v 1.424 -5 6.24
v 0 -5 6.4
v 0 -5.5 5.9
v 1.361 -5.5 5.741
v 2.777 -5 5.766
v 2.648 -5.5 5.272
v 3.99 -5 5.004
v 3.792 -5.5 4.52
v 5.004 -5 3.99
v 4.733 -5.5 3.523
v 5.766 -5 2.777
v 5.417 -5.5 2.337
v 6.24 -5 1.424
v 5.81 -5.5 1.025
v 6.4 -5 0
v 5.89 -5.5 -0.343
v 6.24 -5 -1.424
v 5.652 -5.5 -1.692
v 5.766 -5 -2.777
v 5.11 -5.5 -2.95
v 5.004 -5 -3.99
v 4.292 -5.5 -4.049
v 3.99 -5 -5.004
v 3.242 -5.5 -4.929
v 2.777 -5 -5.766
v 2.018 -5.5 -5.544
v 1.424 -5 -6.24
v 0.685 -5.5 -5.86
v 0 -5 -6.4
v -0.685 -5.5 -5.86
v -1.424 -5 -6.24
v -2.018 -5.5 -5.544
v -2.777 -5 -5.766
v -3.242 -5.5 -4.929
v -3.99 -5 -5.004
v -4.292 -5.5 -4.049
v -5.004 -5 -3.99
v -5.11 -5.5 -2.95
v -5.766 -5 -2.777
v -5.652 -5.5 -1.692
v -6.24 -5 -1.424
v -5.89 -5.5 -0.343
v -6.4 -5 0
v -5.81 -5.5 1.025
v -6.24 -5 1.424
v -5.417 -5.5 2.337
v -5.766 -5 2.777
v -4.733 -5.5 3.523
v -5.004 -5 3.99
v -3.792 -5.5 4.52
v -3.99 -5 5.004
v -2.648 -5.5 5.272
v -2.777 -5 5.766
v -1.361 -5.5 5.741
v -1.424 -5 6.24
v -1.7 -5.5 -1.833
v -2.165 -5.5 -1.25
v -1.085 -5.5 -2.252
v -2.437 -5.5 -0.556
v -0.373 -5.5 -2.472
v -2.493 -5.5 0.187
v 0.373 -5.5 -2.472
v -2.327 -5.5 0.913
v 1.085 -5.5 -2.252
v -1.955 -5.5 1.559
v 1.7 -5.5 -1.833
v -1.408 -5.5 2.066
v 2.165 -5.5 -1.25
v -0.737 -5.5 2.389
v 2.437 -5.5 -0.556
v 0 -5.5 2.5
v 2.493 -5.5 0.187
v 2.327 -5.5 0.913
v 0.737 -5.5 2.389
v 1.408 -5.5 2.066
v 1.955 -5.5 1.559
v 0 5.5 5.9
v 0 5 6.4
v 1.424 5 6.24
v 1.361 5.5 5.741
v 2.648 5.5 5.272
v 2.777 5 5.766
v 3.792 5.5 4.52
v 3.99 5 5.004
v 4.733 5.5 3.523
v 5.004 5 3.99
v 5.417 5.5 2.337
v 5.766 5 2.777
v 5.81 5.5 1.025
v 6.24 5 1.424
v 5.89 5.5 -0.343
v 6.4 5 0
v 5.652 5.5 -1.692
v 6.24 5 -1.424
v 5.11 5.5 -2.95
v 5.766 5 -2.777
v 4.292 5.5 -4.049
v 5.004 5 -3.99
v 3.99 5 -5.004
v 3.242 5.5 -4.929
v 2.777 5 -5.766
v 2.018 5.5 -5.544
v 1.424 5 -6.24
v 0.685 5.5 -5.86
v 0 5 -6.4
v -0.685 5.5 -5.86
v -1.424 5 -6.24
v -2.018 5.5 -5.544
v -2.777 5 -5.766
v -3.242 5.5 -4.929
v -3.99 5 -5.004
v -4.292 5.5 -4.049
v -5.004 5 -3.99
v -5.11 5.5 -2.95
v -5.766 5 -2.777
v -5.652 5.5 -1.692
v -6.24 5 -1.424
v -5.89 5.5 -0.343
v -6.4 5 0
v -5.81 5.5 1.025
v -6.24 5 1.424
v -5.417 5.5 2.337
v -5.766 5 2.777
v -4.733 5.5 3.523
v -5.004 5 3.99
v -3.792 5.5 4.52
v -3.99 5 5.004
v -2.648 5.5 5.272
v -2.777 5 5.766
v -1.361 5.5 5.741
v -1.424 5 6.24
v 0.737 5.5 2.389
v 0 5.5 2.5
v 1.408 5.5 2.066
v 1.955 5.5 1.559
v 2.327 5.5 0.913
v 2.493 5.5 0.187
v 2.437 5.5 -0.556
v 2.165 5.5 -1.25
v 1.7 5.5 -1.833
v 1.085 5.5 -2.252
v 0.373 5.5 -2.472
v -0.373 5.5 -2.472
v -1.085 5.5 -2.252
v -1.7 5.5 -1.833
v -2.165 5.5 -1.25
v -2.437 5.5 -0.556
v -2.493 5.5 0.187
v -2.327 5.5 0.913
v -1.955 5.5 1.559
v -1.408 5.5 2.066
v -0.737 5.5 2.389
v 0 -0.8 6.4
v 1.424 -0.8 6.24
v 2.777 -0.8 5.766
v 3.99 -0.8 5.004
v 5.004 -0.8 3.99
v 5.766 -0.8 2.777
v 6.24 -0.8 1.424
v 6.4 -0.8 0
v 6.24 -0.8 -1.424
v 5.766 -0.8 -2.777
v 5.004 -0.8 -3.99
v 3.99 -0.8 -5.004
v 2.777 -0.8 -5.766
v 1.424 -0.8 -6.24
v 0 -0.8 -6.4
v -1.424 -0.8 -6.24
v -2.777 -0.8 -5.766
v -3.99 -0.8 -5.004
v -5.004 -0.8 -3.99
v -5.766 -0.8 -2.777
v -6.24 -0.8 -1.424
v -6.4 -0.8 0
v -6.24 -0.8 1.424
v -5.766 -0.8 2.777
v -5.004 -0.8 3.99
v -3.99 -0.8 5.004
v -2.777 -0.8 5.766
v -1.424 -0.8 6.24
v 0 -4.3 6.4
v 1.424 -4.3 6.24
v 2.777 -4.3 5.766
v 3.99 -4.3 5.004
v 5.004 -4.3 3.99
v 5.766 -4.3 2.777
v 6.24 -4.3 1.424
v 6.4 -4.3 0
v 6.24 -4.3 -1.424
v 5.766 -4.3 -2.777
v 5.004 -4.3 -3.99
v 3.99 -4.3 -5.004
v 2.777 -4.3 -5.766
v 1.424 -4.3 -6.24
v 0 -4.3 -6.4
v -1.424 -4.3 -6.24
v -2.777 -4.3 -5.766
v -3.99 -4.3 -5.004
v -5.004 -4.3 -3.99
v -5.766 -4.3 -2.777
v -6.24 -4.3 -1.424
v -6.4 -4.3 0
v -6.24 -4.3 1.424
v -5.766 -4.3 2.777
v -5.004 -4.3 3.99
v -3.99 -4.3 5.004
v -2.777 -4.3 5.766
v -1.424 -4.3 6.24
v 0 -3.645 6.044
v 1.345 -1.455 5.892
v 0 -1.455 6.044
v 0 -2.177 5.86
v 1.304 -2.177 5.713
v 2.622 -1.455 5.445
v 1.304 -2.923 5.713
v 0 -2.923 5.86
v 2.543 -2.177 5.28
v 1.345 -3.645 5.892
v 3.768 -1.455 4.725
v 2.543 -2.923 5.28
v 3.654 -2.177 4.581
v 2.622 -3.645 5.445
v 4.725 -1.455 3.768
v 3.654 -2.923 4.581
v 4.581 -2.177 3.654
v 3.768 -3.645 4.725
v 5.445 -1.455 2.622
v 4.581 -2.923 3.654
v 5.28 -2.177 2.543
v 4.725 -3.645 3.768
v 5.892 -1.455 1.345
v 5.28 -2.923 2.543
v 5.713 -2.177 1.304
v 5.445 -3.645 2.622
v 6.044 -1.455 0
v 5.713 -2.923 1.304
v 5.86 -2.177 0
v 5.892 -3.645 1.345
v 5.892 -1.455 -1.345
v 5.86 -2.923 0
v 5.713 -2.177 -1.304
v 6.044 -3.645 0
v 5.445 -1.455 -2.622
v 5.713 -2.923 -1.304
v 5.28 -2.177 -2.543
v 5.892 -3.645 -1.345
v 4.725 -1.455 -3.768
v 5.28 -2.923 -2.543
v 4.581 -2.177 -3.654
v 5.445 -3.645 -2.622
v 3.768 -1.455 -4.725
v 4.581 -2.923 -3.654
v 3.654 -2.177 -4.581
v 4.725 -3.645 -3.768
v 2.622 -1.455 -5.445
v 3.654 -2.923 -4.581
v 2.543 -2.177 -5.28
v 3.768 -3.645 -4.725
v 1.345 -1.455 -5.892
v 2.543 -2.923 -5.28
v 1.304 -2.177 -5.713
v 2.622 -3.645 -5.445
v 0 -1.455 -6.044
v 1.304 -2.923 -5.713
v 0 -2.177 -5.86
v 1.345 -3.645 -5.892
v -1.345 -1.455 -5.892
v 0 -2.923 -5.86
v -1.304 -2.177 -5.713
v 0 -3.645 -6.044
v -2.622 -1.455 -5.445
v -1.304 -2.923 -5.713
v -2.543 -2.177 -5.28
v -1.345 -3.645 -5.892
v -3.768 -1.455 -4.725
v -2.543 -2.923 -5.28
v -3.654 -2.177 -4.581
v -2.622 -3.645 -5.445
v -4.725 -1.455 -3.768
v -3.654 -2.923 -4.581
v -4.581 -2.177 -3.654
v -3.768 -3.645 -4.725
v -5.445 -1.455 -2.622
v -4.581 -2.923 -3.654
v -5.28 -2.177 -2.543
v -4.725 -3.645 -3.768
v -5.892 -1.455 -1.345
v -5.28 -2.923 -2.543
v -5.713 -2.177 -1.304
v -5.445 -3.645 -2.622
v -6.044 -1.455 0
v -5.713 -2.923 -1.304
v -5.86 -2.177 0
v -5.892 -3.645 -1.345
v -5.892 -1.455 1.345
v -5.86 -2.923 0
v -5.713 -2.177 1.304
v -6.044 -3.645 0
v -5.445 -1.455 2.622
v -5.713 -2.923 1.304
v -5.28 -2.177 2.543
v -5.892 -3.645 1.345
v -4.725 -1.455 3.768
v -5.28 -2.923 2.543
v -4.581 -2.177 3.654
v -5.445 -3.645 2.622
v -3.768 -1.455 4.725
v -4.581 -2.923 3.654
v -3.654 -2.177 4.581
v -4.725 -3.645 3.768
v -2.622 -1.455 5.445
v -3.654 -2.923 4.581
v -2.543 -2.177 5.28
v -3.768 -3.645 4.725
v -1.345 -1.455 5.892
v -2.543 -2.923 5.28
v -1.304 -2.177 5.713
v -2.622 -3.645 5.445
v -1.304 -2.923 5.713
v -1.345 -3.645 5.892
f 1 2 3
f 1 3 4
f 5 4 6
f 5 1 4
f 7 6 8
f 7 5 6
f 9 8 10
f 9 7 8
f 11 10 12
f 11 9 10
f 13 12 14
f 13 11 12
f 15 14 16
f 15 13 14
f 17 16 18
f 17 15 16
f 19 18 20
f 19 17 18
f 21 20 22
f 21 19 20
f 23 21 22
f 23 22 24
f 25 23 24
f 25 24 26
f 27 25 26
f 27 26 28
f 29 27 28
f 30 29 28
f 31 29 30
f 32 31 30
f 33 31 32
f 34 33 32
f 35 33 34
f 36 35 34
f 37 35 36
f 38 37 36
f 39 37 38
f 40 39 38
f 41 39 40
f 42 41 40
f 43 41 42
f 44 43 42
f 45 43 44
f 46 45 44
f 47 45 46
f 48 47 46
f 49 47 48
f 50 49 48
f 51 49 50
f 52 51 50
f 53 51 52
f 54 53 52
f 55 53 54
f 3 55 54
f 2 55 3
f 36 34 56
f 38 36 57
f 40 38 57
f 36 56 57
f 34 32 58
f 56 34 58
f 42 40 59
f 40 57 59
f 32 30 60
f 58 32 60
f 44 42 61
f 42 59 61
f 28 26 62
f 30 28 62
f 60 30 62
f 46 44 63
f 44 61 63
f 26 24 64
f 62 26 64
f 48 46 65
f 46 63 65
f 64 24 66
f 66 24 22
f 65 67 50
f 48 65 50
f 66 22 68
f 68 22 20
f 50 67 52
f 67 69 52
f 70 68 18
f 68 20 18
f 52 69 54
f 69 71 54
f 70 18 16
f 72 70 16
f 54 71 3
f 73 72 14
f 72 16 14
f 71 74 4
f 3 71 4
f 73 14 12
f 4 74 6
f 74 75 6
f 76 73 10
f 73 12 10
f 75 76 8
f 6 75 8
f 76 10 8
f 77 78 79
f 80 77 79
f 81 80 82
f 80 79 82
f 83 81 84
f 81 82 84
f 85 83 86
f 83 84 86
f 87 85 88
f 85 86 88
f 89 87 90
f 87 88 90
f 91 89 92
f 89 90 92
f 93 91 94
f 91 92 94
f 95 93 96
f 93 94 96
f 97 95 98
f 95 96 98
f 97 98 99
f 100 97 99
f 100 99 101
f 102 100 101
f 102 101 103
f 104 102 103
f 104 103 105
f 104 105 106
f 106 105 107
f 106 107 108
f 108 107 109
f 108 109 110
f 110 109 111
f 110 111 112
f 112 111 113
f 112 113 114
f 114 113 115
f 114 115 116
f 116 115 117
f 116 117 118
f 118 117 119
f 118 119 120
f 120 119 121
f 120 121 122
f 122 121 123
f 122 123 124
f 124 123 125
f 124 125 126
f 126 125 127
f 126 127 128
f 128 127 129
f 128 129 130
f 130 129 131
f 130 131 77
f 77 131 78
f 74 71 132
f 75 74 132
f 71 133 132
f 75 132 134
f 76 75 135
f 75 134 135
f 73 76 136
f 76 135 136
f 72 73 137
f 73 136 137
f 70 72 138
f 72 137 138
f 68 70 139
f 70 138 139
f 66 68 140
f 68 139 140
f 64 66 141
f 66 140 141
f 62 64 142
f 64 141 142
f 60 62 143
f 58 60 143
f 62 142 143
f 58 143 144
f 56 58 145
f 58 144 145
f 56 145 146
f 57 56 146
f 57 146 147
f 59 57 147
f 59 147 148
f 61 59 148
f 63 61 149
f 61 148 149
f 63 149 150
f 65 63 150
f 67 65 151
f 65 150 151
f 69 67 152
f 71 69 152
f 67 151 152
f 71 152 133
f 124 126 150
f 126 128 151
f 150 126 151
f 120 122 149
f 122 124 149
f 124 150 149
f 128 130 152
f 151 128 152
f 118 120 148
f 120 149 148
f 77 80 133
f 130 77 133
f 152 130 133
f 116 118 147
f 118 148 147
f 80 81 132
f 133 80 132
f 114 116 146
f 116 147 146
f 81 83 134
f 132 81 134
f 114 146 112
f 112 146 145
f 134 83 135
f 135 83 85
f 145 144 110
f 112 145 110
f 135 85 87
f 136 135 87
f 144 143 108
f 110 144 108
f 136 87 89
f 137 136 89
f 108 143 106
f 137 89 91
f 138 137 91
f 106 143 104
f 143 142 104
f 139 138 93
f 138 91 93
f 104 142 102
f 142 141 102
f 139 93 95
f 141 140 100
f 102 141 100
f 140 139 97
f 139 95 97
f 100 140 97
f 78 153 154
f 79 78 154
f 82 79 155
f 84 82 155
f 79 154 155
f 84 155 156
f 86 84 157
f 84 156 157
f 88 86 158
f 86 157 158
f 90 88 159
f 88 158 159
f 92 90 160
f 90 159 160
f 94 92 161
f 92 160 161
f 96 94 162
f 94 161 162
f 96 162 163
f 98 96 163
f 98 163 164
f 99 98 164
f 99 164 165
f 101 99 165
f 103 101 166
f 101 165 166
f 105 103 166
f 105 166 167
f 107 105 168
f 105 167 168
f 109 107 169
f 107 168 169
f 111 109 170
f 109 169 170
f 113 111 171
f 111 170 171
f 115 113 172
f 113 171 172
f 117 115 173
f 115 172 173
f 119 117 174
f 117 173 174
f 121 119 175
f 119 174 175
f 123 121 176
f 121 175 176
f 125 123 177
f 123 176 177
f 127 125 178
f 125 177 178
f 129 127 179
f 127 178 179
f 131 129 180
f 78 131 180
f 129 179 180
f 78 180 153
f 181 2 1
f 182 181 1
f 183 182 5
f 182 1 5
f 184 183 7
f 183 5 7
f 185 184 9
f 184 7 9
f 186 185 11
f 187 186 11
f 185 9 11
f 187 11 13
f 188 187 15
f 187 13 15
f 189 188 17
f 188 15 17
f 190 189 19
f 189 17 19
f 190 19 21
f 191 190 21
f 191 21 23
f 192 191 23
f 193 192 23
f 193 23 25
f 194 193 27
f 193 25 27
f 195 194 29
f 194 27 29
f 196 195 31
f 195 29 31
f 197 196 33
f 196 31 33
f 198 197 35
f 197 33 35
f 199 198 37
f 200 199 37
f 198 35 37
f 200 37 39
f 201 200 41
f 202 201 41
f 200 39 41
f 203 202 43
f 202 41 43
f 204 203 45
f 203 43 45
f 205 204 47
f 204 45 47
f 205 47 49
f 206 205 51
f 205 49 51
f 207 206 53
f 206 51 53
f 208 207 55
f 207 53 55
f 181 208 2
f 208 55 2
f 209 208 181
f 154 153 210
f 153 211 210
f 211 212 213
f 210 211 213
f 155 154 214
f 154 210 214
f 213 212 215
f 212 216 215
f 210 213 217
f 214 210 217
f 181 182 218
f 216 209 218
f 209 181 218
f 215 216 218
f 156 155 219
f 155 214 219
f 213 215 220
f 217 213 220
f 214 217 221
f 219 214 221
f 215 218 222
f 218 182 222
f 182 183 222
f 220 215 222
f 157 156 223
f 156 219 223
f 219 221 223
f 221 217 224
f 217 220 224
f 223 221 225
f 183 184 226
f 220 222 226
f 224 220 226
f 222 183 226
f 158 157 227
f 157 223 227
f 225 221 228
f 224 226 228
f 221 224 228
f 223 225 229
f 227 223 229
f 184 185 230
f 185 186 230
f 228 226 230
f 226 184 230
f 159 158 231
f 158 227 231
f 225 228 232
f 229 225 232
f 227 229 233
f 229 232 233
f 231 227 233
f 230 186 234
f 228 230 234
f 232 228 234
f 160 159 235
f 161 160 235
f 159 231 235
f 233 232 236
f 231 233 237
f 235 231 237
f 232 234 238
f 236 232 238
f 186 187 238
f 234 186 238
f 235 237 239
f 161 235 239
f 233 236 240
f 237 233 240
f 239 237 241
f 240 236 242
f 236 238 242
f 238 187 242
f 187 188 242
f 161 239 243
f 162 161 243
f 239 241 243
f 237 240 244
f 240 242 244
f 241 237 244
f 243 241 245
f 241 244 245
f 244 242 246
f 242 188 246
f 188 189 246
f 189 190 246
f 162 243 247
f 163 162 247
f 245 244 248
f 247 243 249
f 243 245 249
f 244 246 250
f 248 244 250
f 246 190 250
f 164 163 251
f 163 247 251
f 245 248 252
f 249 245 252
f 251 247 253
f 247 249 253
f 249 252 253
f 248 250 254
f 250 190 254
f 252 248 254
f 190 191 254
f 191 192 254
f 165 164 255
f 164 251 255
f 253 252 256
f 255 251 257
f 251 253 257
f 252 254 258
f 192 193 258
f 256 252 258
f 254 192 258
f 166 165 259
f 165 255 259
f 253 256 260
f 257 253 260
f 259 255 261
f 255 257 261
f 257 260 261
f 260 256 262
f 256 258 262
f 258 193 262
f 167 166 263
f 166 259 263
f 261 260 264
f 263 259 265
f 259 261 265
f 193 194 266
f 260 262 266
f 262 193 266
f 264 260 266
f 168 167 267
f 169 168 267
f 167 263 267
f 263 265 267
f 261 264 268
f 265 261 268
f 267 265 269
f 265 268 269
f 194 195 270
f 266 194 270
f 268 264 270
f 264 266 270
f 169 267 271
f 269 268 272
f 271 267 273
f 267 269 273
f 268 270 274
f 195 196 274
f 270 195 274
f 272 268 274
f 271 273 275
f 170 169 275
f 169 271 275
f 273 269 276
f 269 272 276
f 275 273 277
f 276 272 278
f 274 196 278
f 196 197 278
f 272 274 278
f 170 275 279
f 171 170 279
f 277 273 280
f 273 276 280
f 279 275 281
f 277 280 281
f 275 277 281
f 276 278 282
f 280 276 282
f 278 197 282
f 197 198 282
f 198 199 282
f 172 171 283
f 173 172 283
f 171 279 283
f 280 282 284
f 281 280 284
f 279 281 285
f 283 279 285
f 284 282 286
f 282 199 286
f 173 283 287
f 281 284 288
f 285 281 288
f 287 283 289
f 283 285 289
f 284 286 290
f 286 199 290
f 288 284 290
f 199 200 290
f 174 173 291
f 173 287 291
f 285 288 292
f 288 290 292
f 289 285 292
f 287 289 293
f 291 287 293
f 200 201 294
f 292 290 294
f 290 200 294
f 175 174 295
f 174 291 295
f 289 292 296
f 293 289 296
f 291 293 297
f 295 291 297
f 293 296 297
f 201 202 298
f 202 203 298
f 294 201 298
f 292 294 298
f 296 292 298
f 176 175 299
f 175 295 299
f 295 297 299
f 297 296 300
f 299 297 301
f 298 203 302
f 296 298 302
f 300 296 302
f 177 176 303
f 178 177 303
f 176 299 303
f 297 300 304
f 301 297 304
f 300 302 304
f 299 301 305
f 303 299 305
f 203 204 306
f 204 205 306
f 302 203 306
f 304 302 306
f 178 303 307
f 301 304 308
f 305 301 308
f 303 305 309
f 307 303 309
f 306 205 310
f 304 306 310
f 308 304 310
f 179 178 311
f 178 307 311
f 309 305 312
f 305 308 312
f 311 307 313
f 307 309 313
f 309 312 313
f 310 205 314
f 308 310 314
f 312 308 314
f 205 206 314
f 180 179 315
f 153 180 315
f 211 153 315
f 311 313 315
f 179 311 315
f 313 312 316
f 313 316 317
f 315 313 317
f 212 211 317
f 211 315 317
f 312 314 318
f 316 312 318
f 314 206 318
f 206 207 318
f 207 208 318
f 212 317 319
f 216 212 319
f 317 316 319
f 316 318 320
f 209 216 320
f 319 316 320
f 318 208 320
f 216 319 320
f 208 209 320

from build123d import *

# Parameters (mm, degrees)
F3_SIZE = 0.5


with BuildPart() as f2:
    # F0 (on Right) → F2 (revolve)
    with BuildSketch(Plane.YZ):
        with BuildLine():
            Line((-5.5, 6.4), (-5.5, 2.5))
            Line((-5.5, 2.5), (5.5, 2.5))
            Line((5.5, 2.5), (5.5, 6.4))
            Line((5.5, 6.4), (-0.8, 6.4))
            ThreePointArc((-0.8, 6.4), (-2.55, 5.836699), (-4.3, 6.4))
            Line((-4.3, 6.4), (-5.5, 6.4))
        make_face()
    revolve(axis=Axis((0, 2.864314, 0), (0, 1, 0)))

    # F3
    f3_edges = [f2.edges().sort_by_distance(p)[0] for p in [
        (0, -5.5, -6.4),
        (0, 5.5, -6.4),
    ]]
    chamfer(f3_edges, length=F3_SIZE)


solid = f2.part
